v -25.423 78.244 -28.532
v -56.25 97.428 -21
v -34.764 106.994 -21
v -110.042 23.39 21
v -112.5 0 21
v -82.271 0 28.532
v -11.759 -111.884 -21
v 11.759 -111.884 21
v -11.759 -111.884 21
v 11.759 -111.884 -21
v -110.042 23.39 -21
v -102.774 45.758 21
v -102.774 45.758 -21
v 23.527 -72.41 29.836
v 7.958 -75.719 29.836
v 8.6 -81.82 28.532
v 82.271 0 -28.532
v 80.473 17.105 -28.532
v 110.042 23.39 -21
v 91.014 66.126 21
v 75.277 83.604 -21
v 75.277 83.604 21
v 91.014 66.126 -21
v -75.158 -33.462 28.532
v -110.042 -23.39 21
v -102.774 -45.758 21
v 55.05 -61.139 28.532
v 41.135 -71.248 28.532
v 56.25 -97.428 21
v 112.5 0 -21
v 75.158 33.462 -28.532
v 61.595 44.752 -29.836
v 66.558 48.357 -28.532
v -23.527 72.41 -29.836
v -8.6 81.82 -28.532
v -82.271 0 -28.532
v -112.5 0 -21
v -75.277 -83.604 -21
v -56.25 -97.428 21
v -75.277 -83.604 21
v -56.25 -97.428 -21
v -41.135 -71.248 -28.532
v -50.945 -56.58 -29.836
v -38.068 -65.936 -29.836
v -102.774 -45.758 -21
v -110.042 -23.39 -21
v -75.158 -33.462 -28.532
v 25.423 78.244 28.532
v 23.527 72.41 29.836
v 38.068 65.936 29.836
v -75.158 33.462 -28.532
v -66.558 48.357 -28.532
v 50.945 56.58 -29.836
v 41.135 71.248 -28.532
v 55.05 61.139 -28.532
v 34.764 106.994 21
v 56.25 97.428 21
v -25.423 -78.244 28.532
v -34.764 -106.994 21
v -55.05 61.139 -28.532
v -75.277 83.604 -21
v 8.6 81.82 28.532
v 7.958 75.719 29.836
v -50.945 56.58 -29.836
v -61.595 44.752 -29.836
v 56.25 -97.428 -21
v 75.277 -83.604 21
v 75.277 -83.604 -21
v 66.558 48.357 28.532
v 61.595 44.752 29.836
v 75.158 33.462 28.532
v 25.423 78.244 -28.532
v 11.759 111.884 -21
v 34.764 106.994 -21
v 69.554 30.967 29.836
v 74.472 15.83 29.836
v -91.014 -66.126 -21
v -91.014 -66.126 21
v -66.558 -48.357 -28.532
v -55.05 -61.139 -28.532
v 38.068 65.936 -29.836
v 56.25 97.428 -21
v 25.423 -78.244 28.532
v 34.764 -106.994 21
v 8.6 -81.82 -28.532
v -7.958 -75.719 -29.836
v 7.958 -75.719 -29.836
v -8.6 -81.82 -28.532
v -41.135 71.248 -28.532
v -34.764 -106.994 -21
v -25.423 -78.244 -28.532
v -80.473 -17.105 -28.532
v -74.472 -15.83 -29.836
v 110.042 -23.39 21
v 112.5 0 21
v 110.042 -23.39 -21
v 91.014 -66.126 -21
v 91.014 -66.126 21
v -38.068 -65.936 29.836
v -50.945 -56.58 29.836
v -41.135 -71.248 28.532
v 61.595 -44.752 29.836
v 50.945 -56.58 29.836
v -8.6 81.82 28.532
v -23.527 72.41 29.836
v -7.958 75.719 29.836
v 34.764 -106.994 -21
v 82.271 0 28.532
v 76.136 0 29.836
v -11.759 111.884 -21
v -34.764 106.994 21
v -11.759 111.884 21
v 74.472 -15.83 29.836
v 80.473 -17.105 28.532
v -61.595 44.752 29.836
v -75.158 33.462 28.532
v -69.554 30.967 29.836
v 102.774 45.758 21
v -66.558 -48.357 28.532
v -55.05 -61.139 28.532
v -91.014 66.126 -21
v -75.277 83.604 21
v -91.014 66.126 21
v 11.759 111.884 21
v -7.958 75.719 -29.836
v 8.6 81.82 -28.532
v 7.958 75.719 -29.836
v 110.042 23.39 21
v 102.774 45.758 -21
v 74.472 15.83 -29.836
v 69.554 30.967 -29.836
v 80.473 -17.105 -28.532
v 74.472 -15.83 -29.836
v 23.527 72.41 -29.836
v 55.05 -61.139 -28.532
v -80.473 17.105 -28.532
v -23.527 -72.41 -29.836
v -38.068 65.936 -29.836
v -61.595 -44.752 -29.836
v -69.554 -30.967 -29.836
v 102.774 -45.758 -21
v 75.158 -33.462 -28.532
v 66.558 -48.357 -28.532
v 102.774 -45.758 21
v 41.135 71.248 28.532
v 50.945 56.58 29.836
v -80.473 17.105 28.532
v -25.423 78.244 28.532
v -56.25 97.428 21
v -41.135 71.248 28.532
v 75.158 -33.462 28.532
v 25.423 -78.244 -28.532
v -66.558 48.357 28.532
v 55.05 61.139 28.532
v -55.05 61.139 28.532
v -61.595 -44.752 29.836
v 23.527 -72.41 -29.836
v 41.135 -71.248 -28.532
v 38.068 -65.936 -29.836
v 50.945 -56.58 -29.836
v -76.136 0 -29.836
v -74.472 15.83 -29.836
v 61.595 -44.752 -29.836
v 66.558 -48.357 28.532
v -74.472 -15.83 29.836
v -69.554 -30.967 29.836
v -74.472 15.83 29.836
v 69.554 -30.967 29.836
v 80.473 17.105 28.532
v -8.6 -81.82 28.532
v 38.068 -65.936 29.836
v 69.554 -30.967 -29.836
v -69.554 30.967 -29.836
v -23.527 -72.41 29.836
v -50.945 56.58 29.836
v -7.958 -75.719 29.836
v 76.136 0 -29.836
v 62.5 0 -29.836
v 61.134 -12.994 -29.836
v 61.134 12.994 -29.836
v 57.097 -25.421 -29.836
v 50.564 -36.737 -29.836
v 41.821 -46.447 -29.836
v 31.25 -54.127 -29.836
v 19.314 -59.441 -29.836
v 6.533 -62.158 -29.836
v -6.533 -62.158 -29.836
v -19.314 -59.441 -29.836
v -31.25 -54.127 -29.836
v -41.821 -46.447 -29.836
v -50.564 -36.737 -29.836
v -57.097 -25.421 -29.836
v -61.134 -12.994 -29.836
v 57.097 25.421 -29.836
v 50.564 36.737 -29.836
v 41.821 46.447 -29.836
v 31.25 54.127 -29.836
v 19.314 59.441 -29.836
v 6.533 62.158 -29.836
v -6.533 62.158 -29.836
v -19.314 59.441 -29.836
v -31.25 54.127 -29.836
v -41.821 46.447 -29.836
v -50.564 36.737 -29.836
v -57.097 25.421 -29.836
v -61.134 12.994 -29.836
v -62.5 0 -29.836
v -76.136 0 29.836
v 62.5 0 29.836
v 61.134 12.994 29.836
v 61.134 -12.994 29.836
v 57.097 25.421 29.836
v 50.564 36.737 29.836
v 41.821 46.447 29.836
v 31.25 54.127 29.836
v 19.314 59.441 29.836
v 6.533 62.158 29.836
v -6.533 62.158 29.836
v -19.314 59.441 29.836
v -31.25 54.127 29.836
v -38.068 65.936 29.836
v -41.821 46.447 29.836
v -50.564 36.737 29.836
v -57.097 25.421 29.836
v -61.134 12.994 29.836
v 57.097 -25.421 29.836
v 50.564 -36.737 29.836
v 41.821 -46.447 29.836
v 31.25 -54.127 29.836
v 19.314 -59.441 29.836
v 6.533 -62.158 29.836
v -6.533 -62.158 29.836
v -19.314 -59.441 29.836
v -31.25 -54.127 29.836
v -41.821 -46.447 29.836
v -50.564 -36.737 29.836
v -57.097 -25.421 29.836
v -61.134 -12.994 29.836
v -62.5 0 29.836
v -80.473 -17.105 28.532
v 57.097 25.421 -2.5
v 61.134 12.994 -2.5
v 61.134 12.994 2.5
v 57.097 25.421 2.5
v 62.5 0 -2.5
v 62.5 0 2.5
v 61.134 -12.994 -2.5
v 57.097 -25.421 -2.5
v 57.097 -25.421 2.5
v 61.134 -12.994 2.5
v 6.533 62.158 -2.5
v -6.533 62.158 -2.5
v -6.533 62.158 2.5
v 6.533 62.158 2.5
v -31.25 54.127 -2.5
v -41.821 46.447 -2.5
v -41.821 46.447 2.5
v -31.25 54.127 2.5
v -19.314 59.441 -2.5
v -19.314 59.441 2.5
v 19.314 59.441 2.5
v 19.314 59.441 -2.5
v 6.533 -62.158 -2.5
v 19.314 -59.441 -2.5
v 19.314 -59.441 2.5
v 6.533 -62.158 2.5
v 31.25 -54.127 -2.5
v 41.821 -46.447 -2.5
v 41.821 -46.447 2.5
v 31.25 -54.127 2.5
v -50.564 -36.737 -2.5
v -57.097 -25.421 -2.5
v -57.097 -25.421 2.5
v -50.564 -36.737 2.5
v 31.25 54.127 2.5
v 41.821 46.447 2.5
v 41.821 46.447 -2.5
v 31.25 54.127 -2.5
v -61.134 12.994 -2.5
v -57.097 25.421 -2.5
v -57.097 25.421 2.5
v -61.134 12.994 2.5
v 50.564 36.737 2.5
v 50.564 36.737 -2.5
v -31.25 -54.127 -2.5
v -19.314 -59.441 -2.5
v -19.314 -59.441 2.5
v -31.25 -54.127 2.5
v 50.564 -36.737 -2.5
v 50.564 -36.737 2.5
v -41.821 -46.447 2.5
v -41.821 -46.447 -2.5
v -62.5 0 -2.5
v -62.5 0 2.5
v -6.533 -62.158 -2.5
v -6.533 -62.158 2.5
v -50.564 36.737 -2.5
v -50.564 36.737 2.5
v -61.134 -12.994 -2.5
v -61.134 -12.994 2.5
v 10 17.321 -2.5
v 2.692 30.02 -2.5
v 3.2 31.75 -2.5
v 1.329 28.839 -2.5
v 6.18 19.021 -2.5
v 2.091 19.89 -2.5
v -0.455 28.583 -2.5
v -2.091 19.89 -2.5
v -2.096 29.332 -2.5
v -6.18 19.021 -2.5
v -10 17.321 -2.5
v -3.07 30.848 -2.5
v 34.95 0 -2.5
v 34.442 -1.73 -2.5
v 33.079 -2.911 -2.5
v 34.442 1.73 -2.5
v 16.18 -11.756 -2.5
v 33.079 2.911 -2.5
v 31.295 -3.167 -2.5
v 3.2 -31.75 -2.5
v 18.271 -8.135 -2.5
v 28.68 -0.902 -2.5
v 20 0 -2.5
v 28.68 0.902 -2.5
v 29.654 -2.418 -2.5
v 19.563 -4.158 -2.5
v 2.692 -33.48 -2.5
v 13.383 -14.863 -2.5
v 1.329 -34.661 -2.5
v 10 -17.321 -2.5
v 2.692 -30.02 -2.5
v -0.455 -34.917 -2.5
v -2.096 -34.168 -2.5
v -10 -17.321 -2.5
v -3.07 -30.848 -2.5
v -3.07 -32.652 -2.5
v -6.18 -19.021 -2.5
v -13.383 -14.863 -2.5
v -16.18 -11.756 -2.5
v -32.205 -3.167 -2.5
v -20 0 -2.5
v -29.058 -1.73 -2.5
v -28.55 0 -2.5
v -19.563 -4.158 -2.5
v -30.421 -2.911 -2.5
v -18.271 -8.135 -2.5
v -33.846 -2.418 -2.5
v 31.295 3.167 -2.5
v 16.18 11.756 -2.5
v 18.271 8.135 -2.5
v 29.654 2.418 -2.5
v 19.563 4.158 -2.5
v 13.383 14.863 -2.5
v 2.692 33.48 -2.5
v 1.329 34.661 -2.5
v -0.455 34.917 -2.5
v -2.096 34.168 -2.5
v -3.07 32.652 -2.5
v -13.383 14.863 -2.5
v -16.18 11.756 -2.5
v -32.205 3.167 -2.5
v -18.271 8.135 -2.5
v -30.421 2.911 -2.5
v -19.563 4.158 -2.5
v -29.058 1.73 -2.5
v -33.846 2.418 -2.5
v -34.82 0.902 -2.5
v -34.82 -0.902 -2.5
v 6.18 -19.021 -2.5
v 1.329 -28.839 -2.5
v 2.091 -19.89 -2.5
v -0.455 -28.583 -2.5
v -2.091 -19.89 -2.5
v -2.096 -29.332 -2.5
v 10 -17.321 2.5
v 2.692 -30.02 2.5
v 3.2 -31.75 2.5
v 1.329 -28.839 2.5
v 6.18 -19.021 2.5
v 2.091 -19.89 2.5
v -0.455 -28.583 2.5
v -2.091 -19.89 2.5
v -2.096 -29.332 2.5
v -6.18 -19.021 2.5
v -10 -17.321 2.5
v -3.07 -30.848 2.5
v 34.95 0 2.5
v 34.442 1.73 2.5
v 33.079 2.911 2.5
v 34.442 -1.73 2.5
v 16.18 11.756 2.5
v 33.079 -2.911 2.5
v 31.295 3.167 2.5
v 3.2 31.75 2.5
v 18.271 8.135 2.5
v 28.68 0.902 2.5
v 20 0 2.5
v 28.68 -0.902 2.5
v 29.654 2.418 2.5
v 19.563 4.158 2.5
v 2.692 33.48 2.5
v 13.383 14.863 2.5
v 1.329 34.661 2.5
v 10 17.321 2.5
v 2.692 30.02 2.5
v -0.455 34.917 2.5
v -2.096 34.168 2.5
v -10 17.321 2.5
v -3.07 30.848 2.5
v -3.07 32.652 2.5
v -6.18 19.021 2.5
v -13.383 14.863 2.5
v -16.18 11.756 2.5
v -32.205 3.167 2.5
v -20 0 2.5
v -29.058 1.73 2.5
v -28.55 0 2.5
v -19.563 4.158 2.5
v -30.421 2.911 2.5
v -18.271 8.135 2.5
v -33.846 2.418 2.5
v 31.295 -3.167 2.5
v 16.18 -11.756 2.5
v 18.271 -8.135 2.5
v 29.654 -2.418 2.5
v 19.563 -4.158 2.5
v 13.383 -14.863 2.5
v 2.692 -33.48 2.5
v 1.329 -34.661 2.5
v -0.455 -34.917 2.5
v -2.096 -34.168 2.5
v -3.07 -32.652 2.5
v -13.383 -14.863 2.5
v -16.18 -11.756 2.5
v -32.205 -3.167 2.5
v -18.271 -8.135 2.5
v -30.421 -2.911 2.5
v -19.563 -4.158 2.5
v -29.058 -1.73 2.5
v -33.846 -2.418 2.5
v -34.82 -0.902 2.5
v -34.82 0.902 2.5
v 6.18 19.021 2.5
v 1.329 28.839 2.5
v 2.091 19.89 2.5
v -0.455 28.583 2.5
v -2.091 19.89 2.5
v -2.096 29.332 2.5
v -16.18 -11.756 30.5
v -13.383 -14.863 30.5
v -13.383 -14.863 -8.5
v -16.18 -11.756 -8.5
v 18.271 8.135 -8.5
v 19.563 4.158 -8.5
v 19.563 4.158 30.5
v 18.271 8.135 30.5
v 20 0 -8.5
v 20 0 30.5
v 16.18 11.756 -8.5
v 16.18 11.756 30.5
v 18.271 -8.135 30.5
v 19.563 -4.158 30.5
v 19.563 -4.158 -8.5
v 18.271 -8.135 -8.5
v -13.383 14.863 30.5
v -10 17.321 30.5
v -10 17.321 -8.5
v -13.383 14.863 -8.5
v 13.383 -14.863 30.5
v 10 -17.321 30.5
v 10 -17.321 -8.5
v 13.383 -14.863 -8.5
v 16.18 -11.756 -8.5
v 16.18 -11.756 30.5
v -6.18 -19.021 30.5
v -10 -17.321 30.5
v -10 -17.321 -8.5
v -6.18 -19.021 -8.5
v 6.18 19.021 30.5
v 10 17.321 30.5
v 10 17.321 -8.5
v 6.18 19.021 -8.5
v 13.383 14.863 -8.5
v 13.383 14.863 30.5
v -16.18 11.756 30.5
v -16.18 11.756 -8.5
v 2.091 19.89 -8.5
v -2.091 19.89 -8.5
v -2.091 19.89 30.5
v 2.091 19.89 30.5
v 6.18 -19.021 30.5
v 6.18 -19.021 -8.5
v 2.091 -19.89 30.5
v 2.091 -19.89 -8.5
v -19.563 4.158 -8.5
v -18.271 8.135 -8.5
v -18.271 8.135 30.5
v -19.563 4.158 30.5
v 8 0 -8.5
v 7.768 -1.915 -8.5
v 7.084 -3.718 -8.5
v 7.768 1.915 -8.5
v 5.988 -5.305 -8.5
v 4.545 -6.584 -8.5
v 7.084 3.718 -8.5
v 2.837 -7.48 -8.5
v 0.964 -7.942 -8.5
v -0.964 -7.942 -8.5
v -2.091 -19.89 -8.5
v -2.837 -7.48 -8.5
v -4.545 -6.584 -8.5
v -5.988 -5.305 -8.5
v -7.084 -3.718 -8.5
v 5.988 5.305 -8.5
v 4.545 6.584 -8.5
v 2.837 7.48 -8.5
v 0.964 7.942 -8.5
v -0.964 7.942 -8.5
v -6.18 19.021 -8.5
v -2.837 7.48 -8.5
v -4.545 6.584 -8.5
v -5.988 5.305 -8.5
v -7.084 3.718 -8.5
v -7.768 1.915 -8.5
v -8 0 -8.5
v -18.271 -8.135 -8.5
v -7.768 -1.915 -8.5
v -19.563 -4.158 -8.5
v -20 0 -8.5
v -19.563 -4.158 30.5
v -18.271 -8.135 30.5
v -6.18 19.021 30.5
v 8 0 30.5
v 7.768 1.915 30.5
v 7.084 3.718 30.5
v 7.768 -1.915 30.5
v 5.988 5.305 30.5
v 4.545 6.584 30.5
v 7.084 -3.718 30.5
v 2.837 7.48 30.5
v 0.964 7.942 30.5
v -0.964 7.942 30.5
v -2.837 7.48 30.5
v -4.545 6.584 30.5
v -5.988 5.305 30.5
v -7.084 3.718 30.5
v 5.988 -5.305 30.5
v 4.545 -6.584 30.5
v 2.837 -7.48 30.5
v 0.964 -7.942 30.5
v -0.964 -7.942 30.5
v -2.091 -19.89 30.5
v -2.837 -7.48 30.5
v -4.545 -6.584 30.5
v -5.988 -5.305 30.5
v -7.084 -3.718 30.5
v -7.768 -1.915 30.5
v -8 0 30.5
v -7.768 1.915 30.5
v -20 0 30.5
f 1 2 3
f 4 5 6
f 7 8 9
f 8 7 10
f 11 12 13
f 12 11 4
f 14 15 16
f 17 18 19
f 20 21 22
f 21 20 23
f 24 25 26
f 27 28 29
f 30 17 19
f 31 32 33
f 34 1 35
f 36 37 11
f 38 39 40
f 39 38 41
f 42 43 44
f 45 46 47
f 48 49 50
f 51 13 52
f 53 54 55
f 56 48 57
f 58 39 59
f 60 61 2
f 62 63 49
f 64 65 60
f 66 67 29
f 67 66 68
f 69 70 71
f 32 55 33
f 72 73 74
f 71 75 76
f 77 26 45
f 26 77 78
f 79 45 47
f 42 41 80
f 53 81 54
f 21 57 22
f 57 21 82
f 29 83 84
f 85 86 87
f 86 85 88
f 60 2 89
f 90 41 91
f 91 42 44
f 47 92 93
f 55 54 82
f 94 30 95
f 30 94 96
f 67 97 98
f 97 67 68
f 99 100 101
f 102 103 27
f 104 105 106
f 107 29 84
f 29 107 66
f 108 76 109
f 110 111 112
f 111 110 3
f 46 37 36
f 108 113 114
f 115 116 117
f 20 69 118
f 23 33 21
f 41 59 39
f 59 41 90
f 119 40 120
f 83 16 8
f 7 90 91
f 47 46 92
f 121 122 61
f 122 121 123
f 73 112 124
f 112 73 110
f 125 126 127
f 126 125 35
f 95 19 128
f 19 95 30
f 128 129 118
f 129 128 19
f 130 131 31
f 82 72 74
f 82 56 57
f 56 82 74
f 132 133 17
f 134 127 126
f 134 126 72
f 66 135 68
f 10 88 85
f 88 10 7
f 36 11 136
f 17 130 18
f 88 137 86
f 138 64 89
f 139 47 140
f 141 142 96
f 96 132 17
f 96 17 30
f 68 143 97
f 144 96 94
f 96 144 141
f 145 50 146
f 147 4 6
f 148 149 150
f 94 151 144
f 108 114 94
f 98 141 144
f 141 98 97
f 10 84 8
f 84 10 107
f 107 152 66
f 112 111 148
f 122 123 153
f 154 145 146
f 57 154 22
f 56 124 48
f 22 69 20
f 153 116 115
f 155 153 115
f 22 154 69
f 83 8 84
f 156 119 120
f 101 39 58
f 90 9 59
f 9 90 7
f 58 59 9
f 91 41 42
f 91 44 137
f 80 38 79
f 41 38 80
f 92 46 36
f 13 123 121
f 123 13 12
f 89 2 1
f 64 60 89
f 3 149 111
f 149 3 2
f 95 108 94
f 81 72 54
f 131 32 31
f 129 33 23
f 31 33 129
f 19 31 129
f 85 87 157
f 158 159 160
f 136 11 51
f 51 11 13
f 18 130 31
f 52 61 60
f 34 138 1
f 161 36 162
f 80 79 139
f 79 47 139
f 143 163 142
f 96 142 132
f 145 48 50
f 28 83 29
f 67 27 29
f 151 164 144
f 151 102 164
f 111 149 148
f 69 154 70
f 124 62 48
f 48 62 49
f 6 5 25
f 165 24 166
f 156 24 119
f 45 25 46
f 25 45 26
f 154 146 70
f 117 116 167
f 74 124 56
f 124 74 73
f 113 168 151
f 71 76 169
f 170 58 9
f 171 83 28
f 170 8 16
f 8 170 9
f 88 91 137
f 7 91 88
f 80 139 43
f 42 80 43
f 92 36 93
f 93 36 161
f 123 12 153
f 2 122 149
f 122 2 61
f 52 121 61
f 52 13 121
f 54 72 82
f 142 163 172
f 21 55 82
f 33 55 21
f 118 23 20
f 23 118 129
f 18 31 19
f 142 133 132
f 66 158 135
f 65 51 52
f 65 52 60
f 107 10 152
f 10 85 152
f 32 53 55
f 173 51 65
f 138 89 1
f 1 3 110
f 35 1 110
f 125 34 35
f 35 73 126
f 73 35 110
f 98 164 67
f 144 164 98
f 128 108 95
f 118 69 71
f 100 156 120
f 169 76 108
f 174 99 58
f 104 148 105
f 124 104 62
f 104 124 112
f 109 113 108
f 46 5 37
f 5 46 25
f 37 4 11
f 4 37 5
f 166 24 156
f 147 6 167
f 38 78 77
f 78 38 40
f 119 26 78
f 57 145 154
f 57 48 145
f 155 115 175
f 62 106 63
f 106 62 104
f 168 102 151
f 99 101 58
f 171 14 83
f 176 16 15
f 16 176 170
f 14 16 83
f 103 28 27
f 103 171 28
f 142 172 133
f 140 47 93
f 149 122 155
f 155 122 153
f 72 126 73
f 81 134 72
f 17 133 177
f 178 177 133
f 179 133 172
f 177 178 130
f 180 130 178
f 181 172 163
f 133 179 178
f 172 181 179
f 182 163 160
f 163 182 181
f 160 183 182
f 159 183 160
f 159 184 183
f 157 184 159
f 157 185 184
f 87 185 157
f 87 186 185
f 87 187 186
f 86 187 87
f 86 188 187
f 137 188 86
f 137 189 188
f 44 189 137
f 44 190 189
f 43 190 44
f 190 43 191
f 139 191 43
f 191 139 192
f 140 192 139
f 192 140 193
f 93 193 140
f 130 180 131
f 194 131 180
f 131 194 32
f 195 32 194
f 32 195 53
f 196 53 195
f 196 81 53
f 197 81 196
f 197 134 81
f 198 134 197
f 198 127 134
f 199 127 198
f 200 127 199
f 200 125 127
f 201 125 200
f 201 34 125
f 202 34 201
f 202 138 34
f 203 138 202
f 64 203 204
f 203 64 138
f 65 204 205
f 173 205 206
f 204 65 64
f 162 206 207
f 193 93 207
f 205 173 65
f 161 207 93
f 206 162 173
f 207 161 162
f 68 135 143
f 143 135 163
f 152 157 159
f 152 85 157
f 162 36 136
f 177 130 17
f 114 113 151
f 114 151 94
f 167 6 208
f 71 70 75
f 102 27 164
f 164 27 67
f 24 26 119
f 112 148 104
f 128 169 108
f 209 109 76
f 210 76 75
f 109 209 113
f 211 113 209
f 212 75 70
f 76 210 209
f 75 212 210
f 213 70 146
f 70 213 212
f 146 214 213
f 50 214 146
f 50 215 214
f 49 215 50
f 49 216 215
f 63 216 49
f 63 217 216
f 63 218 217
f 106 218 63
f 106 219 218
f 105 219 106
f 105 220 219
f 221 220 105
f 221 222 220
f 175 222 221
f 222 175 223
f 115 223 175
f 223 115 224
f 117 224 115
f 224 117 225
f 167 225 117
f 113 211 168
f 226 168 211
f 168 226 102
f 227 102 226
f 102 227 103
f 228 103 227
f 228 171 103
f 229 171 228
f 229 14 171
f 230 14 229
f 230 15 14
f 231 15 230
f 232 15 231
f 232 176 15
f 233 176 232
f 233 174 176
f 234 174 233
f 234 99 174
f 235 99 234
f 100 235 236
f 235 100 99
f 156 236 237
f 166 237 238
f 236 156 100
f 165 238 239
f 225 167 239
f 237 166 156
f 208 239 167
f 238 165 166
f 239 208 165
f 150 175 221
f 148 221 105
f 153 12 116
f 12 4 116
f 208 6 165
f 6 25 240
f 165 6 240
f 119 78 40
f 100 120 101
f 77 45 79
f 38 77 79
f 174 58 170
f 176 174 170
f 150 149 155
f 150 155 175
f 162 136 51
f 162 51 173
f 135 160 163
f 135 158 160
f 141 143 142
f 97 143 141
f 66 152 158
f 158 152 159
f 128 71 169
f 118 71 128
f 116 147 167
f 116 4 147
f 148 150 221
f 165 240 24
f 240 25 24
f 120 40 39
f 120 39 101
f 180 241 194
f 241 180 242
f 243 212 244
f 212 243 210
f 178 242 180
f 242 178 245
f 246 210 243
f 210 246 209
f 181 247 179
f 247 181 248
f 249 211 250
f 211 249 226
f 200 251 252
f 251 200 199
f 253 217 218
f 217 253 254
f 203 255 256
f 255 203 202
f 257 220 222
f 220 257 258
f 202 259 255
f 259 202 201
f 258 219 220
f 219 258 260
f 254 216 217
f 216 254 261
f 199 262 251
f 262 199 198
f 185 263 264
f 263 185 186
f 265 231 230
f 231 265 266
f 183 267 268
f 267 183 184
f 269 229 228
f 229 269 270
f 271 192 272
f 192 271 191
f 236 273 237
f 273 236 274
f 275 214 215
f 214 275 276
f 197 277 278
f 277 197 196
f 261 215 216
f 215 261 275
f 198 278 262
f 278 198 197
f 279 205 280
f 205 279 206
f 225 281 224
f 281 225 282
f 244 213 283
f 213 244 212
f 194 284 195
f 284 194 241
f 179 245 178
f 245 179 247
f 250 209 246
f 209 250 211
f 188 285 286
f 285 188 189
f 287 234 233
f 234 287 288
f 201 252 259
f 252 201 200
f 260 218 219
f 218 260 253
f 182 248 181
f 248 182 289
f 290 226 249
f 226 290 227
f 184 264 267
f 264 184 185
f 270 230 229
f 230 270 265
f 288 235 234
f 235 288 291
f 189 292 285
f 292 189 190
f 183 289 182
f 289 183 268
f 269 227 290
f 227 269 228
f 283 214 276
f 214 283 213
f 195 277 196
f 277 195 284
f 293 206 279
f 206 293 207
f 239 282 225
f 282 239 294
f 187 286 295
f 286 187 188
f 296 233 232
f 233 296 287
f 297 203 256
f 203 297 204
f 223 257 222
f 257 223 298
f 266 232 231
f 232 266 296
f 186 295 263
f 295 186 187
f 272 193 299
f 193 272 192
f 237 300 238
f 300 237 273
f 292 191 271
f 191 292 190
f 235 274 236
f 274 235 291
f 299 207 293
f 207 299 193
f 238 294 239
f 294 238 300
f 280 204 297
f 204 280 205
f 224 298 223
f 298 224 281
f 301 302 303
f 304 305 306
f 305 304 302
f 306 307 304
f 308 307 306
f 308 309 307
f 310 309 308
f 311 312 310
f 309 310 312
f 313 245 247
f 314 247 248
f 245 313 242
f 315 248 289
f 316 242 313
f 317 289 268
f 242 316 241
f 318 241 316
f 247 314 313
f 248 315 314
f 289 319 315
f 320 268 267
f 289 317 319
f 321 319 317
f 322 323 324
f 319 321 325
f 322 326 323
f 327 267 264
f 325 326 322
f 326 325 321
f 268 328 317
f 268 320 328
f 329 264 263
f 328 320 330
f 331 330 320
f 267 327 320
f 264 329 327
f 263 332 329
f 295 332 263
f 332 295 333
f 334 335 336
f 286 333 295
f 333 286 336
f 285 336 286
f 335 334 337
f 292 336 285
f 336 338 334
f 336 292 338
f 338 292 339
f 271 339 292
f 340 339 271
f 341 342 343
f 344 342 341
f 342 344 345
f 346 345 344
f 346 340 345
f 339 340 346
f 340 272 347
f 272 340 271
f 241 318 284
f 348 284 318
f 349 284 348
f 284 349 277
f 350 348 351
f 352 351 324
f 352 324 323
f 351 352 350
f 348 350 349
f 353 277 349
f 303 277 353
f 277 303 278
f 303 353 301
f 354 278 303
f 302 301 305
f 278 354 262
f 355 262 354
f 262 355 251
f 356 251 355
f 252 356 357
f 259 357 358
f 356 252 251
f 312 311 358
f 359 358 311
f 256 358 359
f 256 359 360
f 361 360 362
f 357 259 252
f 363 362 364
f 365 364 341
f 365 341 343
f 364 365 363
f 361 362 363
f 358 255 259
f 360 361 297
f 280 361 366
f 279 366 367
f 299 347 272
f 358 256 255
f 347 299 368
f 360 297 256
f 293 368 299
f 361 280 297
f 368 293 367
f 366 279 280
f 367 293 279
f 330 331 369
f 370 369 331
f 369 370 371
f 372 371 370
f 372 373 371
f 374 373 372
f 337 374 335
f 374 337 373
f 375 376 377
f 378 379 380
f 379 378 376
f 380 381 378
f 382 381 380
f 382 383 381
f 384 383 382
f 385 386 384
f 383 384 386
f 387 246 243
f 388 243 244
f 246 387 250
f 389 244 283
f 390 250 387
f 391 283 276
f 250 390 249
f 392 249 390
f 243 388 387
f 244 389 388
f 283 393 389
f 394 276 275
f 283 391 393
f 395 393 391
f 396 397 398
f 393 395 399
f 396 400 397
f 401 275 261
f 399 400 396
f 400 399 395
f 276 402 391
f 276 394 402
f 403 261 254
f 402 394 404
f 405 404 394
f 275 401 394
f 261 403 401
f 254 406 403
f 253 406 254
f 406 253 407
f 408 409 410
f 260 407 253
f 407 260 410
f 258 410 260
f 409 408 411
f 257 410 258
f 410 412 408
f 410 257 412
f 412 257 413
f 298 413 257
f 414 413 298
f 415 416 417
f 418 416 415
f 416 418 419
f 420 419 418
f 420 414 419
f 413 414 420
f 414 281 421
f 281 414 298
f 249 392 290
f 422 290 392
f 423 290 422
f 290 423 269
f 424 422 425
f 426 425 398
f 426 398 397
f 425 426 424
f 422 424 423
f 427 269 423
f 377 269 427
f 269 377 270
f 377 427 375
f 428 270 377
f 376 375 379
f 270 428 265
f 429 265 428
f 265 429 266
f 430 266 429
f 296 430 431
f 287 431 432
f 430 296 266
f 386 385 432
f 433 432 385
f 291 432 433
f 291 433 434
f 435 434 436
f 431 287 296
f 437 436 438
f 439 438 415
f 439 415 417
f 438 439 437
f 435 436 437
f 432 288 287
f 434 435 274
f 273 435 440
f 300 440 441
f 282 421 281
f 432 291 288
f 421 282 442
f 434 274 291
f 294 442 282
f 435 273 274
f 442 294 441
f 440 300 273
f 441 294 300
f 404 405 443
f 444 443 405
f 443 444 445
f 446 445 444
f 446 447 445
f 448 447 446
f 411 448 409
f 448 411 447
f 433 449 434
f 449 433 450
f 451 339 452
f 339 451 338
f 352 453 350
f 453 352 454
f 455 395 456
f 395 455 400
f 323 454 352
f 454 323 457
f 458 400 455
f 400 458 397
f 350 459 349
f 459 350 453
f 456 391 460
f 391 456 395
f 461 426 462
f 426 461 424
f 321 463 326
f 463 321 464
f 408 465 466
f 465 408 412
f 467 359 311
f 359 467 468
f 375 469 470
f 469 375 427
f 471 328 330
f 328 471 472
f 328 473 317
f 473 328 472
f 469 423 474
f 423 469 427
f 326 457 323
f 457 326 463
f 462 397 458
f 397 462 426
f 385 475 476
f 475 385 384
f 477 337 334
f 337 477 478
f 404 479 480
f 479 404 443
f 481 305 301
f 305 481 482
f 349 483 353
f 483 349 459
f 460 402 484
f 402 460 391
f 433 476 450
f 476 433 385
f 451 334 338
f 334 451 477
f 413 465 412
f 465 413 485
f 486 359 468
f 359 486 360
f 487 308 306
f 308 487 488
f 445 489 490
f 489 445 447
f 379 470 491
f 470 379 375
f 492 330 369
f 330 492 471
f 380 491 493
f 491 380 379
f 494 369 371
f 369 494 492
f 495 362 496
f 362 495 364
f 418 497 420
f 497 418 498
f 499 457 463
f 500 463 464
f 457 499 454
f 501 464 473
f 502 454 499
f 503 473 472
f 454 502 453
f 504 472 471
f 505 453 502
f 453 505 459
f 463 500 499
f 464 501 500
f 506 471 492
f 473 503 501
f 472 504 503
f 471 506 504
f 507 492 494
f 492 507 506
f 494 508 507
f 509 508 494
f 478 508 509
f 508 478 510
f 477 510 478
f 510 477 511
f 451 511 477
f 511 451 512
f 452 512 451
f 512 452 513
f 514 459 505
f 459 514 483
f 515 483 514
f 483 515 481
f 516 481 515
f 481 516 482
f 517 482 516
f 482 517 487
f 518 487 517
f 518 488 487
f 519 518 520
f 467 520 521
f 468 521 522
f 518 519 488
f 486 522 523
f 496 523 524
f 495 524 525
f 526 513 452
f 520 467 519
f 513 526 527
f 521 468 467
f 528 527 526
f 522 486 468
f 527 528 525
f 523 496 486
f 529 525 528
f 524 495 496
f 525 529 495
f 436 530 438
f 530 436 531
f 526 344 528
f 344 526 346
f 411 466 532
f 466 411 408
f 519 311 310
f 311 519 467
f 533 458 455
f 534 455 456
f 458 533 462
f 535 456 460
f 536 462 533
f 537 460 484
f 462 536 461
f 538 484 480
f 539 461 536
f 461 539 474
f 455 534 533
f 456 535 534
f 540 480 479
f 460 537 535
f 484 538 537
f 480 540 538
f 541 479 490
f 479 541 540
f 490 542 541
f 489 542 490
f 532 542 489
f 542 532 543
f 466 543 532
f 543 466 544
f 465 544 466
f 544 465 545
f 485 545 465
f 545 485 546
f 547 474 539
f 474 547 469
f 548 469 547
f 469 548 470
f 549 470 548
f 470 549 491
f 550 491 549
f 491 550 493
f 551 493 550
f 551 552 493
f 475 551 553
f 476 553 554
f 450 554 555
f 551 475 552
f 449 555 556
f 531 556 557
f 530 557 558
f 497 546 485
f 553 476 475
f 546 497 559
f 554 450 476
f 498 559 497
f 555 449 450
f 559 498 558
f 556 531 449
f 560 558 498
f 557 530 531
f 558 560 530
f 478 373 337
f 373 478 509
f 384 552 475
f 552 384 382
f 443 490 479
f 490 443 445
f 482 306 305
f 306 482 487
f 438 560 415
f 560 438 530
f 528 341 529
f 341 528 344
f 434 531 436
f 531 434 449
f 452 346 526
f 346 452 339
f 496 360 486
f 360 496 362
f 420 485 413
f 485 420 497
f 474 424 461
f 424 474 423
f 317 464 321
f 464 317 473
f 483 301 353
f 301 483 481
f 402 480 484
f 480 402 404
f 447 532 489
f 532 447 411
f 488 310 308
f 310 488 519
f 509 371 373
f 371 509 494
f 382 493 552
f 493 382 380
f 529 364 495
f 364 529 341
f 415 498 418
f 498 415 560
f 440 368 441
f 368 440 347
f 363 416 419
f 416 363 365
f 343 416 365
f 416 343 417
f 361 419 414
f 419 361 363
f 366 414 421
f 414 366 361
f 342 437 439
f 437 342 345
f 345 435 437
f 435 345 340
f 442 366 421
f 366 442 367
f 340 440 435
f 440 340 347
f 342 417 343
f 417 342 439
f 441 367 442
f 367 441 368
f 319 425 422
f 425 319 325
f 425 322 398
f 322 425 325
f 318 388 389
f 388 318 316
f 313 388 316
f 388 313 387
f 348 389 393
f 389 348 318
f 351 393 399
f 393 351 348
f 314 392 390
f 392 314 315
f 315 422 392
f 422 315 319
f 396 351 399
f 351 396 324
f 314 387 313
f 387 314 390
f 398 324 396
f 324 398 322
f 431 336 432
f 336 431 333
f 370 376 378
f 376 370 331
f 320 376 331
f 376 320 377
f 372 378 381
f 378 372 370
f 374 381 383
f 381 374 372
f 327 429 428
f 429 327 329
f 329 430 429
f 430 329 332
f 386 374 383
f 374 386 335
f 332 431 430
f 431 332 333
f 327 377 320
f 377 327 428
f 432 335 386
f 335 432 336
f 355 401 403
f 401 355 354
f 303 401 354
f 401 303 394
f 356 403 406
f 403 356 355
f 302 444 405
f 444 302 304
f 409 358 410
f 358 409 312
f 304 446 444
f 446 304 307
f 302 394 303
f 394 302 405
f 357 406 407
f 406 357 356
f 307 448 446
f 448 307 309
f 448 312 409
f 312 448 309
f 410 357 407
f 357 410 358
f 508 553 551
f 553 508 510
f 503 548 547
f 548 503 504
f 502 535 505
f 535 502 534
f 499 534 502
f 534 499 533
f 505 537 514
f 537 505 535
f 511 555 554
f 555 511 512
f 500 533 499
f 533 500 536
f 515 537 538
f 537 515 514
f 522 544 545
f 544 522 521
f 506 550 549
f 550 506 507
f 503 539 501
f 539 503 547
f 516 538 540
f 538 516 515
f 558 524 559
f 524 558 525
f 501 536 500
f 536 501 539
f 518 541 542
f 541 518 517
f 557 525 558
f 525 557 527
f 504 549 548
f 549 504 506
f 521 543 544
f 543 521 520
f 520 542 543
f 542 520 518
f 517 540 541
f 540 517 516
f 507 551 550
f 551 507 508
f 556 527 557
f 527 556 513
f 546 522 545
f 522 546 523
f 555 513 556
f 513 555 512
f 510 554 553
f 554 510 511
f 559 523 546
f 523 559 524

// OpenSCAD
// -*-C-*-
// Models of various types of wheels.
//
// Copyright 2013, Brian Davis
//
// License: LGPL 2.1 or later

/*
 * Based on Harbor Freight Item #98950
 */
module 6_inch_semi_solid_wheel() {
  color("black")
  difference() {
    cylinder(r=75, h=37);
    translate([0, 0, -0.05])
      cylinder(r=97 / 2, h=37.1);
  }
  color("white")
  translate([0, 0, -0.05])
  difference() {
    cylinder(r=97 / 2, h=37.1);
    translate([0, 0, -0.05])
      cylinder(r=13 / 2, h=37.2);
  }
  color("white")
  translate([0, 0, 37])
  difference() {
    cylinder(r=21 / 2, h=11);
    translate([0, 0, -0.05])
      cylinder(r=13 / 2, h=11.1);
  }
}

/*
 * Based on Harbor Freight Item #47638
 * NOTE: much detail is lost on the tire and hub.
 */
module 8_inch_inflatable_wheel() {
  color("orange")
  difference() {
    hull() {
      union() {
        rotate_extrude(convexity=10)
          translate([73, 0, 0])
            circle(r=30.0);
        difference() {
          cylinder(r=112.5, h=42, center=true);
          cylinder(r=111.5, h=45, center=true);
        }
      }
    }
    cylinder(r=62.5, h=61, center=true);
  }
  color("silver")
  difference() {
    union() {
      cylinder(r=62.5, h=5, center=true);
      translate([0, 0, 11])
        cylinder(r=20, h=39, center=true);
    }
    union() {
      cylinder(r=8, h=70, center=true);
      for (x_mult = [-1 : 2 : 1]) {
        translate([x_mult * 31.75, 0, 0])
          cylinder(r=3.2, h=20, center=true);
      }
      for (y_mult = [-1 : 2 : 1]) {
        translate([0, y_mult * 31.75, 0])
          cylinder(r=3.2, h=20, center=true);
      }
    }
  }
}


8_inch_inflatable_wheel();
